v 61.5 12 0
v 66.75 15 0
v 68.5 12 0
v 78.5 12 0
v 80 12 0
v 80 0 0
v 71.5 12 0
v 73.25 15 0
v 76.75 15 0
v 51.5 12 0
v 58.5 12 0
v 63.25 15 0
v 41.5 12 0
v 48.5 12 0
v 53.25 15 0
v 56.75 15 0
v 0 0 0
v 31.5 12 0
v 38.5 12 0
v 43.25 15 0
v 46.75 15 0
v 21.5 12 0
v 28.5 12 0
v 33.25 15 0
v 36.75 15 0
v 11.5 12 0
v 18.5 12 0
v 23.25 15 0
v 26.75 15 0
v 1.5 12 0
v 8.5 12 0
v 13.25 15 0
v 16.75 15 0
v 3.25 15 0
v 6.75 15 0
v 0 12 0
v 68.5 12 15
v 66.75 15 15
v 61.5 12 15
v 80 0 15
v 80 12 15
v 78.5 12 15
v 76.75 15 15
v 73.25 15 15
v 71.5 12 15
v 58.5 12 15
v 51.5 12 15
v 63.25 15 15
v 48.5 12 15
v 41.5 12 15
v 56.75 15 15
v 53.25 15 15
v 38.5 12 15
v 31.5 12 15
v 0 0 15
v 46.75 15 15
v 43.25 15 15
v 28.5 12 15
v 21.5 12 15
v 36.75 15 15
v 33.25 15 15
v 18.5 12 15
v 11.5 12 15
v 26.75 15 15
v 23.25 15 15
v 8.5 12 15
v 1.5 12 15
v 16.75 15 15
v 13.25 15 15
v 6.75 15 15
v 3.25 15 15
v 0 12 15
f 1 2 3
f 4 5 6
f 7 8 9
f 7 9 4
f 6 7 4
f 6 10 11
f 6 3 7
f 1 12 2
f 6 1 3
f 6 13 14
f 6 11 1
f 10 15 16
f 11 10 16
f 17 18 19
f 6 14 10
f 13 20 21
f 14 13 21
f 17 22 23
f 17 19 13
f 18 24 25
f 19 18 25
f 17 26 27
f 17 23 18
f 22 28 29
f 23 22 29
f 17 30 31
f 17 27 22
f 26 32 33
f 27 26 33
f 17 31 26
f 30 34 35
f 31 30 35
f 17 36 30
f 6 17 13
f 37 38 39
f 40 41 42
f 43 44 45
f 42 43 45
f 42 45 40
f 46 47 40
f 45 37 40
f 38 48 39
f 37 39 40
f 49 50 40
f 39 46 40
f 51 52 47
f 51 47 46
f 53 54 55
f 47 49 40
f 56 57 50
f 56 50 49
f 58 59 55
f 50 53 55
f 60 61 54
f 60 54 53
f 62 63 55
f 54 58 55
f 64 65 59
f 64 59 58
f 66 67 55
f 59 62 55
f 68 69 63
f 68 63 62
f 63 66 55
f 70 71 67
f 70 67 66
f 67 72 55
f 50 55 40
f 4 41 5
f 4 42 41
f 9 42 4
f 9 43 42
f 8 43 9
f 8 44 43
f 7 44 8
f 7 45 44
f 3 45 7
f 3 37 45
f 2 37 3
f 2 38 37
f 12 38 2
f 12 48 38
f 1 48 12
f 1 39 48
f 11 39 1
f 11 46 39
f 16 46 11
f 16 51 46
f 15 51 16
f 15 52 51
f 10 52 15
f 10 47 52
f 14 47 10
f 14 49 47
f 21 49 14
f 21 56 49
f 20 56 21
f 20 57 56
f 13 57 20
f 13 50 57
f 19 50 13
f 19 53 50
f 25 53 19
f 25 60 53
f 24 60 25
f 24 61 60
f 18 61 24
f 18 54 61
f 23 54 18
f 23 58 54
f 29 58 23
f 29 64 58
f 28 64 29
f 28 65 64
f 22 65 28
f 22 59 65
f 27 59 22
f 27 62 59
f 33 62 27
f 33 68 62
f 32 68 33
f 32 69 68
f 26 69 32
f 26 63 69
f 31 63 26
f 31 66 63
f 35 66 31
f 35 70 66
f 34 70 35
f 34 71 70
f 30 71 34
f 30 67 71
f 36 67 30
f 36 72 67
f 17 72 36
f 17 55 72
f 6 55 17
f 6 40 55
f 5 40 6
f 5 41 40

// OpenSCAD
$fn = 32;

// ----------------------------------------------------------------------
// Gear rack: 8 teeth, pitch 10 mm
// ----------------------------------------------------------------------

// --- parameters (mm) ---
teeth = 8;                // number of teeth
pitch = 10;               // tooth pitch, X
root_w = 7;               // tooth width at the root
tip_w = 3.5;              // tooth width at the tip
base_h = 12;              // rack body height, Y
tooth_h = 3;              // tooth height above the body
plate_t = 15;             // rack width, Z (extrusion height)

rack_l = teeth * pitch;  // overall length
total_h = base_h + tooth_h;  // overall height

profile = [[0, 0], [80, 0], [80, 12], [78.5, 12], [76.75, 15], [73.25, 15], [71.5, 12], [68.5, 12], [66.75, 15], [63.25, 15], [61.5, 12], [58.5, 12], [56.75, 15], [53.25, 15], [51.5, 12], [48.5, 12], [46.75, 15], [43.25, 15], [41.5, 12], [38.5, 12], [36.75, 15], [33.25, 15], [31.5, 12], [28.5, 12], [26.75, 15], [23.25, 15], [21.5, 12], [18.5, 12], [16.75, 15], [13.25, 15], [11.5, 12], [8.5, 12], [6.75, 15], [3.25, 15], [1.5, 12], [0, 12]];  // primary outline, 36 points, counter clockwise

// --- the one profile operation ---
linear_extrude(height = plate_t) polygon(points = profile);
